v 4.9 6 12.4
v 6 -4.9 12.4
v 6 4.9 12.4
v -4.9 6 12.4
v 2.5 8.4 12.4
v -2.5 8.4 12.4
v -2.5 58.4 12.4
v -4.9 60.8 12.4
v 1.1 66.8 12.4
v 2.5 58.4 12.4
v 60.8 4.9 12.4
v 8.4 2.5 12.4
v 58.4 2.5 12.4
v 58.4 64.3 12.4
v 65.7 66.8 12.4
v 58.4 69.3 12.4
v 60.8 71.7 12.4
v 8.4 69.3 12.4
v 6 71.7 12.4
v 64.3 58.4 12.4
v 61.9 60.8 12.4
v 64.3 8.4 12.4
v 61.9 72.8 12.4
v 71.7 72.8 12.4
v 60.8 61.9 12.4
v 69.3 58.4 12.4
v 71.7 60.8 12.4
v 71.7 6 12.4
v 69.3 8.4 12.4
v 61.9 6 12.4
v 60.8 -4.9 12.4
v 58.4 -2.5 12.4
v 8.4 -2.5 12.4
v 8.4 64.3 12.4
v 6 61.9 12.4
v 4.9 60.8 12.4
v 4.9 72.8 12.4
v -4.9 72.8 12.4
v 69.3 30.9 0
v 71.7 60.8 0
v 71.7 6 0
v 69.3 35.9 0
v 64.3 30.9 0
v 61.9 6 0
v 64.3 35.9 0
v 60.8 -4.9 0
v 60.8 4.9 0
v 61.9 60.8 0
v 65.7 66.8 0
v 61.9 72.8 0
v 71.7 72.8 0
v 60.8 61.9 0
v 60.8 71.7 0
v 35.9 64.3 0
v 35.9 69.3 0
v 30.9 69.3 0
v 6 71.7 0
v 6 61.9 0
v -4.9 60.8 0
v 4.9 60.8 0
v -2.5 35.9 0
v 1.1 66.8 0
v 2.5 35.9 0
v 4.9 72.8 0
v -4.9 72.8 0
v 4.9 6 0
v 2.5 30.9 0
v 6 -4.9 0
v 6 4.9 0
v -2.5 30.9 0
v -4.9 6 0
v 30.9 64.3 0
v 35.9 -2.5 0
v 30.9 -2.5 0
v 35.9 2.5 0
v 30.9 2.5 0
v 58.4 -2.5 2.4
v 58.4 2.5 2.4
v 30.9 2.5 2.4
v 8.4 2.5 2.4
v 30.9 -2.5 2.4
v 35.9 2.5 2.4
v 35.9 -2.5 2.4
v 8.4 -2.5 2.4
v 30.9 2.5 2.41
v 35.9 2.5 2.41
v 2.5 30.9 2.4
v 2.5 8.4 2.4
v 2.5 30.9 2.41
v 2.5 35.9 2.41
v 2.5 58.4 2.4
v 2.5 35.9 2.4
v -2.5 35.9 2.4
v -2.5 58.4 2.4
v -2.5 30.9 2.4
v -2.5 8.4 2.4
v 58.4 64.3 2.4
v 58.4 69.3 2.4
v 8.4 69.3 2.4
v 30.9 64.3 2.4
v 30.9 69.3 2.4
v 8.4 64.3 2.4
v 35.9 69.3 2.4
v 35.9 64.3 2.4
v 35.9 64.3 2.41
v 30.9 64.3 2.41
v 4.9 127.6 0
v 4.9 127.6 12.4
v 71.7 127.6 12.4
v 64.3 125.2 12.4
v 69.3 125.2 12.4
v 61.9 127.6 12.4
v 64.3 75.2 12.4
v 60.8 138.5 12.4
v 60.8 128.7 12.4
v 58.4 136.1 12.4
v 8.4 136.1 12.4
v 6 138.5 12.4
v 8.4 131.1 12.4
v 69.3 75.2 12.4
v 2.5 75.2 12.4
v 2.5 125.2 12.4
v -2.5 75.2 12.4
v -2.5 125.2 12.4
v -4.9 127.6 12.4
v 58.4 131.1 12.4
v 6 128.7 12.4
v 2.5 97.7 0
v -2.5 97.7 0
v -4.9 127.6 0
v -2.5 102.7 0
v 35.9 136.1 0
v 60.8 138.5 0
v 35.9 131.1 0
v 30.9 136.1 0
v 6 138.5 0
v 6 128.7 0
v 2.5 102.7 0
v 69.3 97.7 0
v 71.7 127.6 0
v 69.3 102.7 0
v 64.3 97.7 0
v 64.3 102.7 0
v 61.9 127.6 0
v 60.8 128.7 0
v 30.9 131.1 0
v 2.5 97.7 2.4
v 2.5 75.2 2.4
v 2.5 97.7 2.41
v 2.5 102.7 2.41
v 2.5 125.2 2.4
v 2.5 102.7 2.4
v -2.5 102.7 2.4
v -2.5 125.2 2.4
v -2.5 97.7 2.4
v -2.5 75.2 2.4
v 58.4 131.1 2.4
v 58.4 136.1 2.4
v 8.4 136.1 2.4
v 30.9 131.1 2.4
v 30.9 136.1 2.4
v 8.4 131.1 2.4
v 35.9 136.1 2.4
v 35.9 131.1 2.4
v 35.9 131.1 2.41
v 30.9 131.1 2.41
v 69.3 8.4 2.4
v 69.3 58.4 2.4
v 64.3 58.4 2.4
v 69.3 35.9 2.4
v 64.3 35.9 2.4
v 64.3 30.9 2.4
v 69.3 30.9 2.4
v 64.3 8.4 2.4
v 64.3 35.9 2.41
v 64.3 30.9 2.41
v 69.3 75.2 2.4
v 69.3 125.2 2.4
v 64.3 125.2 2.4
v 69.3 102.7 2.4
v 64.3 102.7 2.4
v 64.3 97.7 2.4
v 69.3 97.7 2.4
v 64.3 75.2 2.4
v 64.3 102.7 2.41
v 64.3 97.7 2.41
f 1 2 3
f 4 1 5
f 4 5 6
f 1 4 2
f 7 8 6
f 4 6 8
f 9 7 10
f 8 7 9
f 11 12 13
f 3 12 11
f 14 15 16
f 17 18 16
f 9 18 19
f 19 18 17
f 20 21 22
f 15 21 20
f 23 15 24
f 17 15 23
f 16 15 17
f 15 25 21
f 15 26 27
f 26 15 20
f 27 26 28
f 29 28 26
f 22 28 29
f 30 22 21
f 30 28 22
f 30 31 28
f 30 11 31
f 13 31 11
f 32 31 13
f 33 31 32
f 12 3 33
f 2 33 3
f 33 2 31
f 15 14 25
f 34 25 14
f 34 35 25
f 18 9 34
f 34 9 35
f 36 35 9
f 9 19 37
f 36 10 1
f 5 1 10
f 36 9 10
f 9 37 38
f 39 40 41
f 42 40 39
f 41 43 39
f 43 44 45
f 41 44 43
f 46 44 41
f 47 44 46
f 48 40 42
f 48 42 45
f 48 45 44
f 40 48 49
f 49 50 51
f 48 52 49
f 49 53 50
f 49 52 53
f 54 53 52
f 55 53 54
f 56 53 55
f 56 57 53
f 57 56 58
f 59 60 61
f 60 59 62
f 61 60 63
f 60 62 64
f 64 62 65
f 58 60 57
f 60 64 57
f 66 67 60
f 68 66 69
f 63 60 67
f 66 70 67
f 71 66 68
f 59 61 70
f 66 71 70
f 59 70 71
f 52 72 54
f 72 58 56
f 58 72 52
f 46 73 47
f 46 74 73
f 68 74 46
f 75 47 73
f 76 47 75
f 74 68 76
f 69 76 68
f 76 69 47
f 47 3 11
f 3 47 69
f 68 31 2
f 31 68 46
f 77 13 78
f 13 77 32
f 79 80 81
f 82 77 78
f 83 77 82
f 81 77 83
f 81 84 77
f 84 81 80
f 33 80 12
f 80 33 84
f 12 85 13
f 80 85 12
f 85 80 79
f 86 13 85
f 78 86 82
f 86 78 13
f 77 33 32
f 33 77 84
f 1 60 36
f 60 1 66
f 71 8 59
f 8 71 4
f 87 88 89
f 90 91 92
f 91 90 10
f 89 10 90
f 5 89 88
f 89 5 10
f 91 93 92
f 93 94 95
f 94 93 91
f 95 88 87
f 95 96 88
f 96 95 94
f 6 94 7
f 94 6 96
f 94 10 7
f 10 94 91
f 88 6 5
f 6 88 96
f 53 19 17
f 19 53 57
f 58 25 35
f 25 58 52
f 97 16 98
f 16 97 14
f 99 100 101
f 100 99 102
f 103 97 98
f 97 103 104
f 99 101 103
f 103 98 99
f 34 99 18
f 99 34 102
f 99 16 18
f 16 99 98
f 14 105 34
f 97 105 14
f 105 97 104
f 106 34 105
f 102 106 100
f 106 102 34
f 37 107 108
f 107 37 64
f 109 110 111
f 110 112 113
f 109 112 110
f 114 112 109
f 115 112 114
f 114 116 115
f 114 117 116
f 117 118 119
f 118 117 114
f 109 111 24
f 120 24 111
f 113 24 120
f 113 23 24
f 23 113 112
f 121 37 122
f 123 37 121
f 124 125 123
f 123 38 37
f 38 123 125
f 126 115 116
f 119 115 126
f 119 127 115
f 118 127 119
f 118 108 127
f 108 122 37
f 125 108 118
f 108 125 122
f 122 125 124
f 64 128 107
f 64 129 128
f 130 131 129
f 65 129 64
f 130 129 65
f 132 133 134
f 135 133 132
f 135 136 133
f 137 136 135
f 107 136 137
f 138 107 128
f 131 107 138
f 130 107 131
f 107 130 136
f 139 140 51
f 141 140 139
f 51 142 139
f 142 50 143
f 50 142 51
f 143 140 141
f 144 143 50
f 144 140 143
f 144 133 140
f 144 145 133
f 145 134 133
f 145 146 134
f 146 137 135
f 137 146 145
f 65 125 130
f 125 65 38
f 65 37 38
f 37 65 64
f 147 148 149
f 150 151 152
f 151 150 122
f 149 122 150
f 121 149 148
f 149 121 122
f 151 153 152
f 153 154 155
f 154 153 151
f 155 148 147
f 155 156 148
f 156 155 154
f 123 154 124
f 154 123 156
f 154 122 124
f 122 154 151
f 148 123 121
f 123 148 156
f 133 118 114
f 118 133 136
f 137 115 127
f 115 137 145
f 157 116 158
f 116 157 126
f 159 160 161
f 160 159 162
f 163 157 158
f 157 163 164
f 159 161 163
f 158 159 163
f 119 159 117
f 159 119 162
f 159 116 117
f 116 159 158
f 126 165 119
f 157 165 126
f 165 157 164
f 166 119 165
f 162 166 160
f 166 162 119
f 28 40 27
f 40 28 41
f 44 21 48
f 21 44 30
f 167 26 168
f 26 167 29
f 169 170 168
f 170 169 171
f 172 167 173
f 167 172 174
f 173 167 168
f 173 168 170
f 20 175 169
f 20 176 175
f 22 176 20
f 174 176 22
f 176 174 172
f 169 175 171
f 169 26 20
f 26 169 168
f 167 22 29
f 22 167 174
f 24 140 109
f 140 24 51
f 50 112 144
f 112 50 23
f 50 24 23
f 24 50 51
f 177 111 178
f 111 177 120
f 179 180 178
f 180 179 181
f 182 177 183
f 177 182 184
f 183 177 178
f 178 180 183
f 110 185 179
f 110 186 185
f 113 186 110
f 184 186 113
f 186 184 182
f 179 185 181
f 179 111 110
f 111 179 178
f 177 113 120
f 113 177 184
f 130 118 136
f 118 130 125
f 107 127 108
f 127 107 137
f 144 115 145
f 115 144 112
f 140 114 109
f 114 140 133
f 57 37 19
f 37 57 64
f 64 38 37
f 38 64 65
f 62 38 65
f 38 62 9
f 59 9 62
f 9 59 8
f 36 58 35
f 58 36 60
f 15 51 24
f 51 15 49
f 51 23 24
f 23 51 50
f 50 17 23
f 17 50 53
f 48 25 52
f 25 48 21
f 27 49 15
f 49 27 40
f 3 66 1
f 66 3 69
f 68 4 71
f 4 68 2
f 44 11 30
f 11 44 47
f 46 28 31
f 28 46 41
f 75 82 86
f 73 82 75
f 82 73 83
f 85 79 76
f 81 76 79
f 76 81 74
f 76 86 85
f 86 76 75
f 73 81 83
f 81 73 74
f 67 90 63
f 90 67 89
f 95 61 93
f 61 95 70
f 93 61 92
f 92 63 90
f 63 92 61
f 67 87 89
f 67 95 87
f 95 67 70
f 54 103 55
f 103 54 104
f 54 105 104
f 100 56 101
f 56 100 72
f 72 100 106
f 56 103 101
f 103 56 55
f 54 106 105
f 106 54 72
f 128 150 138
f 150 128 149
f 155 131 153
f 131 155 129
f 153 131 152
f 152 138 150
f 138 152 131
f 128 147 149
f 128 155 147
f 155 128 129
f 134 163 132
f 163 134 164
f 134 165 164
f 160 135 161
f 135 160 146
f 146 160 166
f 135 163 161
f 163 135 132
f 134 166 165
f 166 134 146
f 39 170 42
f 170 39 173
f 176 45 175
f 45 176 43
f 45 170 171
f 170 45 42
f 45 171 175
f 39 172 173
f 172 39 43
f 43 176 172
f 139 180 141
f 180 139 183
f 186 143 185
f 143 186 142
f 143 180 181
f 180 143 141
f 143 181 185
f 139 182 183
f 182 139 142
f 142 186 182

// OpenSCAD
// OpenSCAD LED neon 7 segment display plate
// 
// A plate with slots for pieces of LED neon
// as segments of a 7-segment display

//Height of a single vertical segment
segh = 50;

//Width of a horizontal segment
segw = 50;

//Thickness of lines of the segment
//i.e., LED neon tape width
segt = 5;

//Gap between segments
segg = 6;

//Depth of the slots
segd = 10;

//Floor height
fl = 2.4;

//Slot wall thickness
wt = 2.4;

//Connector thinckness
ct = segd + fl;

//Hole offset horizontal
hoh = 25;

//Hole offset vertical
hov = 25;

///////////////////////////
//Prevent planefighting
pf = 0.01;

sh=segh+2*wt;
sw=segw+2*wt;
st=segt+2*wt;

module onesegh() {
    difference() {
        cube([segw+2*wt, segt+2*wt, segd+fl]);
        translate([wt,wt,fl])
            cube([segw, segt, segd+pf]);
    }

}

module holeh() {
    translate([wt+hoh-segt/2,wt,-pf])
        cube([segt, segt, fl+2*pf]);           
}

module onesegv() {
    difference() {
        cube([segt+2*wt, segh+2*wt, segd+fl]);
        translate([wt,wt,fl])
            cube([segt, segh, segd+pf]);
    }
}

module holev() {
    translate([wt,wt+hov-segt/2,-pf])
        cube([segt, segt, fl+2*pf]);
}

module sevensegslots() {
    translate([segg,-st/2,0])
        onesegh();
    translate([-st/2,segg,0])
        onesegv();
    translate([segg,sh+2*segg-st/2,0])
        onesegh();
    translate([-st/2,sh+3*segg,0])
        onesegv();
    translate([segg,2*sh+4*segg-st/2,0])
        onesegh();
    translate([sw+2*segg-st/2,segg,0])
        onesegv();
    translate([sw+2*segg-st/2,sh+3*segg,0])
        onesegv();
}

module segconn() {
    linear_extrude(height=ct) {
        polygon([[-st/2,segg],[st/2,segg],[segg,st/2],[segg,-st/2]]);
        polygon([[2*segg+sw-st/2,segg],[2*segg+sw+st/2,segg],[segg+sw,-st/2],[segg+sw,st/2]]);
        polygon([[-st/2,segg+sh],[segg-st/2,2*segg+sh],[-st/2,sh+3*segg],[st/2,sh+3*segg],[segg,2*segg+sh+st/2],[segg,2*segg+sh-st/2],[st/2,segg+sh]]);
        polygon([[-st/2,2*sh+3*segg],[st/2,2*sh+3*segg],[segg,4*segg+2*sh-st/2],[segg,4*segg+2*sh+st/2]]);
        polygon([[segg+sw,4*segg+2*sh-st/2],[segg+sw,4*segg+2*sh+st/2],[2*segg+sw+st/2,2*sh+3*segg],[2*segg+sw-st/2,2*sh+3*segg]]);
        polygon([[2*segg+sw-st/2,segg+sh],[segg+sw,2*segg+sh-st/2],[segg+sw,2*segg+sh+st/2],[2*segg+sw-st/2,sh+3*segg],[2*segg+sw+st/2,sh+3*segg],[segg+sw+st/2,2*segg+sh],[2*segg+sw+st/2,segg+sh]]);
    }
}

module drillholes() {
    translate([segg,-st/2,0])
        holeh();
    translate([-st/2,segg,0])
        holev();
    translate([segg,sh+2*segg-st/2,0])
        holeh();
    translate([-st/2,sh+3*segg,0])
        holev();
    translate([segg,2*sh+4*segg-st/2,0])
        holeh();
    translate([sw+2*segg-st/2,segg,0])
        holev();
    translate([sw+2*segg-st/2,sh+3*segg,0])
        holev();
}

difference() {
    union() {
        sevensegslots();
        segconn();
    }
    drillholes();
}
